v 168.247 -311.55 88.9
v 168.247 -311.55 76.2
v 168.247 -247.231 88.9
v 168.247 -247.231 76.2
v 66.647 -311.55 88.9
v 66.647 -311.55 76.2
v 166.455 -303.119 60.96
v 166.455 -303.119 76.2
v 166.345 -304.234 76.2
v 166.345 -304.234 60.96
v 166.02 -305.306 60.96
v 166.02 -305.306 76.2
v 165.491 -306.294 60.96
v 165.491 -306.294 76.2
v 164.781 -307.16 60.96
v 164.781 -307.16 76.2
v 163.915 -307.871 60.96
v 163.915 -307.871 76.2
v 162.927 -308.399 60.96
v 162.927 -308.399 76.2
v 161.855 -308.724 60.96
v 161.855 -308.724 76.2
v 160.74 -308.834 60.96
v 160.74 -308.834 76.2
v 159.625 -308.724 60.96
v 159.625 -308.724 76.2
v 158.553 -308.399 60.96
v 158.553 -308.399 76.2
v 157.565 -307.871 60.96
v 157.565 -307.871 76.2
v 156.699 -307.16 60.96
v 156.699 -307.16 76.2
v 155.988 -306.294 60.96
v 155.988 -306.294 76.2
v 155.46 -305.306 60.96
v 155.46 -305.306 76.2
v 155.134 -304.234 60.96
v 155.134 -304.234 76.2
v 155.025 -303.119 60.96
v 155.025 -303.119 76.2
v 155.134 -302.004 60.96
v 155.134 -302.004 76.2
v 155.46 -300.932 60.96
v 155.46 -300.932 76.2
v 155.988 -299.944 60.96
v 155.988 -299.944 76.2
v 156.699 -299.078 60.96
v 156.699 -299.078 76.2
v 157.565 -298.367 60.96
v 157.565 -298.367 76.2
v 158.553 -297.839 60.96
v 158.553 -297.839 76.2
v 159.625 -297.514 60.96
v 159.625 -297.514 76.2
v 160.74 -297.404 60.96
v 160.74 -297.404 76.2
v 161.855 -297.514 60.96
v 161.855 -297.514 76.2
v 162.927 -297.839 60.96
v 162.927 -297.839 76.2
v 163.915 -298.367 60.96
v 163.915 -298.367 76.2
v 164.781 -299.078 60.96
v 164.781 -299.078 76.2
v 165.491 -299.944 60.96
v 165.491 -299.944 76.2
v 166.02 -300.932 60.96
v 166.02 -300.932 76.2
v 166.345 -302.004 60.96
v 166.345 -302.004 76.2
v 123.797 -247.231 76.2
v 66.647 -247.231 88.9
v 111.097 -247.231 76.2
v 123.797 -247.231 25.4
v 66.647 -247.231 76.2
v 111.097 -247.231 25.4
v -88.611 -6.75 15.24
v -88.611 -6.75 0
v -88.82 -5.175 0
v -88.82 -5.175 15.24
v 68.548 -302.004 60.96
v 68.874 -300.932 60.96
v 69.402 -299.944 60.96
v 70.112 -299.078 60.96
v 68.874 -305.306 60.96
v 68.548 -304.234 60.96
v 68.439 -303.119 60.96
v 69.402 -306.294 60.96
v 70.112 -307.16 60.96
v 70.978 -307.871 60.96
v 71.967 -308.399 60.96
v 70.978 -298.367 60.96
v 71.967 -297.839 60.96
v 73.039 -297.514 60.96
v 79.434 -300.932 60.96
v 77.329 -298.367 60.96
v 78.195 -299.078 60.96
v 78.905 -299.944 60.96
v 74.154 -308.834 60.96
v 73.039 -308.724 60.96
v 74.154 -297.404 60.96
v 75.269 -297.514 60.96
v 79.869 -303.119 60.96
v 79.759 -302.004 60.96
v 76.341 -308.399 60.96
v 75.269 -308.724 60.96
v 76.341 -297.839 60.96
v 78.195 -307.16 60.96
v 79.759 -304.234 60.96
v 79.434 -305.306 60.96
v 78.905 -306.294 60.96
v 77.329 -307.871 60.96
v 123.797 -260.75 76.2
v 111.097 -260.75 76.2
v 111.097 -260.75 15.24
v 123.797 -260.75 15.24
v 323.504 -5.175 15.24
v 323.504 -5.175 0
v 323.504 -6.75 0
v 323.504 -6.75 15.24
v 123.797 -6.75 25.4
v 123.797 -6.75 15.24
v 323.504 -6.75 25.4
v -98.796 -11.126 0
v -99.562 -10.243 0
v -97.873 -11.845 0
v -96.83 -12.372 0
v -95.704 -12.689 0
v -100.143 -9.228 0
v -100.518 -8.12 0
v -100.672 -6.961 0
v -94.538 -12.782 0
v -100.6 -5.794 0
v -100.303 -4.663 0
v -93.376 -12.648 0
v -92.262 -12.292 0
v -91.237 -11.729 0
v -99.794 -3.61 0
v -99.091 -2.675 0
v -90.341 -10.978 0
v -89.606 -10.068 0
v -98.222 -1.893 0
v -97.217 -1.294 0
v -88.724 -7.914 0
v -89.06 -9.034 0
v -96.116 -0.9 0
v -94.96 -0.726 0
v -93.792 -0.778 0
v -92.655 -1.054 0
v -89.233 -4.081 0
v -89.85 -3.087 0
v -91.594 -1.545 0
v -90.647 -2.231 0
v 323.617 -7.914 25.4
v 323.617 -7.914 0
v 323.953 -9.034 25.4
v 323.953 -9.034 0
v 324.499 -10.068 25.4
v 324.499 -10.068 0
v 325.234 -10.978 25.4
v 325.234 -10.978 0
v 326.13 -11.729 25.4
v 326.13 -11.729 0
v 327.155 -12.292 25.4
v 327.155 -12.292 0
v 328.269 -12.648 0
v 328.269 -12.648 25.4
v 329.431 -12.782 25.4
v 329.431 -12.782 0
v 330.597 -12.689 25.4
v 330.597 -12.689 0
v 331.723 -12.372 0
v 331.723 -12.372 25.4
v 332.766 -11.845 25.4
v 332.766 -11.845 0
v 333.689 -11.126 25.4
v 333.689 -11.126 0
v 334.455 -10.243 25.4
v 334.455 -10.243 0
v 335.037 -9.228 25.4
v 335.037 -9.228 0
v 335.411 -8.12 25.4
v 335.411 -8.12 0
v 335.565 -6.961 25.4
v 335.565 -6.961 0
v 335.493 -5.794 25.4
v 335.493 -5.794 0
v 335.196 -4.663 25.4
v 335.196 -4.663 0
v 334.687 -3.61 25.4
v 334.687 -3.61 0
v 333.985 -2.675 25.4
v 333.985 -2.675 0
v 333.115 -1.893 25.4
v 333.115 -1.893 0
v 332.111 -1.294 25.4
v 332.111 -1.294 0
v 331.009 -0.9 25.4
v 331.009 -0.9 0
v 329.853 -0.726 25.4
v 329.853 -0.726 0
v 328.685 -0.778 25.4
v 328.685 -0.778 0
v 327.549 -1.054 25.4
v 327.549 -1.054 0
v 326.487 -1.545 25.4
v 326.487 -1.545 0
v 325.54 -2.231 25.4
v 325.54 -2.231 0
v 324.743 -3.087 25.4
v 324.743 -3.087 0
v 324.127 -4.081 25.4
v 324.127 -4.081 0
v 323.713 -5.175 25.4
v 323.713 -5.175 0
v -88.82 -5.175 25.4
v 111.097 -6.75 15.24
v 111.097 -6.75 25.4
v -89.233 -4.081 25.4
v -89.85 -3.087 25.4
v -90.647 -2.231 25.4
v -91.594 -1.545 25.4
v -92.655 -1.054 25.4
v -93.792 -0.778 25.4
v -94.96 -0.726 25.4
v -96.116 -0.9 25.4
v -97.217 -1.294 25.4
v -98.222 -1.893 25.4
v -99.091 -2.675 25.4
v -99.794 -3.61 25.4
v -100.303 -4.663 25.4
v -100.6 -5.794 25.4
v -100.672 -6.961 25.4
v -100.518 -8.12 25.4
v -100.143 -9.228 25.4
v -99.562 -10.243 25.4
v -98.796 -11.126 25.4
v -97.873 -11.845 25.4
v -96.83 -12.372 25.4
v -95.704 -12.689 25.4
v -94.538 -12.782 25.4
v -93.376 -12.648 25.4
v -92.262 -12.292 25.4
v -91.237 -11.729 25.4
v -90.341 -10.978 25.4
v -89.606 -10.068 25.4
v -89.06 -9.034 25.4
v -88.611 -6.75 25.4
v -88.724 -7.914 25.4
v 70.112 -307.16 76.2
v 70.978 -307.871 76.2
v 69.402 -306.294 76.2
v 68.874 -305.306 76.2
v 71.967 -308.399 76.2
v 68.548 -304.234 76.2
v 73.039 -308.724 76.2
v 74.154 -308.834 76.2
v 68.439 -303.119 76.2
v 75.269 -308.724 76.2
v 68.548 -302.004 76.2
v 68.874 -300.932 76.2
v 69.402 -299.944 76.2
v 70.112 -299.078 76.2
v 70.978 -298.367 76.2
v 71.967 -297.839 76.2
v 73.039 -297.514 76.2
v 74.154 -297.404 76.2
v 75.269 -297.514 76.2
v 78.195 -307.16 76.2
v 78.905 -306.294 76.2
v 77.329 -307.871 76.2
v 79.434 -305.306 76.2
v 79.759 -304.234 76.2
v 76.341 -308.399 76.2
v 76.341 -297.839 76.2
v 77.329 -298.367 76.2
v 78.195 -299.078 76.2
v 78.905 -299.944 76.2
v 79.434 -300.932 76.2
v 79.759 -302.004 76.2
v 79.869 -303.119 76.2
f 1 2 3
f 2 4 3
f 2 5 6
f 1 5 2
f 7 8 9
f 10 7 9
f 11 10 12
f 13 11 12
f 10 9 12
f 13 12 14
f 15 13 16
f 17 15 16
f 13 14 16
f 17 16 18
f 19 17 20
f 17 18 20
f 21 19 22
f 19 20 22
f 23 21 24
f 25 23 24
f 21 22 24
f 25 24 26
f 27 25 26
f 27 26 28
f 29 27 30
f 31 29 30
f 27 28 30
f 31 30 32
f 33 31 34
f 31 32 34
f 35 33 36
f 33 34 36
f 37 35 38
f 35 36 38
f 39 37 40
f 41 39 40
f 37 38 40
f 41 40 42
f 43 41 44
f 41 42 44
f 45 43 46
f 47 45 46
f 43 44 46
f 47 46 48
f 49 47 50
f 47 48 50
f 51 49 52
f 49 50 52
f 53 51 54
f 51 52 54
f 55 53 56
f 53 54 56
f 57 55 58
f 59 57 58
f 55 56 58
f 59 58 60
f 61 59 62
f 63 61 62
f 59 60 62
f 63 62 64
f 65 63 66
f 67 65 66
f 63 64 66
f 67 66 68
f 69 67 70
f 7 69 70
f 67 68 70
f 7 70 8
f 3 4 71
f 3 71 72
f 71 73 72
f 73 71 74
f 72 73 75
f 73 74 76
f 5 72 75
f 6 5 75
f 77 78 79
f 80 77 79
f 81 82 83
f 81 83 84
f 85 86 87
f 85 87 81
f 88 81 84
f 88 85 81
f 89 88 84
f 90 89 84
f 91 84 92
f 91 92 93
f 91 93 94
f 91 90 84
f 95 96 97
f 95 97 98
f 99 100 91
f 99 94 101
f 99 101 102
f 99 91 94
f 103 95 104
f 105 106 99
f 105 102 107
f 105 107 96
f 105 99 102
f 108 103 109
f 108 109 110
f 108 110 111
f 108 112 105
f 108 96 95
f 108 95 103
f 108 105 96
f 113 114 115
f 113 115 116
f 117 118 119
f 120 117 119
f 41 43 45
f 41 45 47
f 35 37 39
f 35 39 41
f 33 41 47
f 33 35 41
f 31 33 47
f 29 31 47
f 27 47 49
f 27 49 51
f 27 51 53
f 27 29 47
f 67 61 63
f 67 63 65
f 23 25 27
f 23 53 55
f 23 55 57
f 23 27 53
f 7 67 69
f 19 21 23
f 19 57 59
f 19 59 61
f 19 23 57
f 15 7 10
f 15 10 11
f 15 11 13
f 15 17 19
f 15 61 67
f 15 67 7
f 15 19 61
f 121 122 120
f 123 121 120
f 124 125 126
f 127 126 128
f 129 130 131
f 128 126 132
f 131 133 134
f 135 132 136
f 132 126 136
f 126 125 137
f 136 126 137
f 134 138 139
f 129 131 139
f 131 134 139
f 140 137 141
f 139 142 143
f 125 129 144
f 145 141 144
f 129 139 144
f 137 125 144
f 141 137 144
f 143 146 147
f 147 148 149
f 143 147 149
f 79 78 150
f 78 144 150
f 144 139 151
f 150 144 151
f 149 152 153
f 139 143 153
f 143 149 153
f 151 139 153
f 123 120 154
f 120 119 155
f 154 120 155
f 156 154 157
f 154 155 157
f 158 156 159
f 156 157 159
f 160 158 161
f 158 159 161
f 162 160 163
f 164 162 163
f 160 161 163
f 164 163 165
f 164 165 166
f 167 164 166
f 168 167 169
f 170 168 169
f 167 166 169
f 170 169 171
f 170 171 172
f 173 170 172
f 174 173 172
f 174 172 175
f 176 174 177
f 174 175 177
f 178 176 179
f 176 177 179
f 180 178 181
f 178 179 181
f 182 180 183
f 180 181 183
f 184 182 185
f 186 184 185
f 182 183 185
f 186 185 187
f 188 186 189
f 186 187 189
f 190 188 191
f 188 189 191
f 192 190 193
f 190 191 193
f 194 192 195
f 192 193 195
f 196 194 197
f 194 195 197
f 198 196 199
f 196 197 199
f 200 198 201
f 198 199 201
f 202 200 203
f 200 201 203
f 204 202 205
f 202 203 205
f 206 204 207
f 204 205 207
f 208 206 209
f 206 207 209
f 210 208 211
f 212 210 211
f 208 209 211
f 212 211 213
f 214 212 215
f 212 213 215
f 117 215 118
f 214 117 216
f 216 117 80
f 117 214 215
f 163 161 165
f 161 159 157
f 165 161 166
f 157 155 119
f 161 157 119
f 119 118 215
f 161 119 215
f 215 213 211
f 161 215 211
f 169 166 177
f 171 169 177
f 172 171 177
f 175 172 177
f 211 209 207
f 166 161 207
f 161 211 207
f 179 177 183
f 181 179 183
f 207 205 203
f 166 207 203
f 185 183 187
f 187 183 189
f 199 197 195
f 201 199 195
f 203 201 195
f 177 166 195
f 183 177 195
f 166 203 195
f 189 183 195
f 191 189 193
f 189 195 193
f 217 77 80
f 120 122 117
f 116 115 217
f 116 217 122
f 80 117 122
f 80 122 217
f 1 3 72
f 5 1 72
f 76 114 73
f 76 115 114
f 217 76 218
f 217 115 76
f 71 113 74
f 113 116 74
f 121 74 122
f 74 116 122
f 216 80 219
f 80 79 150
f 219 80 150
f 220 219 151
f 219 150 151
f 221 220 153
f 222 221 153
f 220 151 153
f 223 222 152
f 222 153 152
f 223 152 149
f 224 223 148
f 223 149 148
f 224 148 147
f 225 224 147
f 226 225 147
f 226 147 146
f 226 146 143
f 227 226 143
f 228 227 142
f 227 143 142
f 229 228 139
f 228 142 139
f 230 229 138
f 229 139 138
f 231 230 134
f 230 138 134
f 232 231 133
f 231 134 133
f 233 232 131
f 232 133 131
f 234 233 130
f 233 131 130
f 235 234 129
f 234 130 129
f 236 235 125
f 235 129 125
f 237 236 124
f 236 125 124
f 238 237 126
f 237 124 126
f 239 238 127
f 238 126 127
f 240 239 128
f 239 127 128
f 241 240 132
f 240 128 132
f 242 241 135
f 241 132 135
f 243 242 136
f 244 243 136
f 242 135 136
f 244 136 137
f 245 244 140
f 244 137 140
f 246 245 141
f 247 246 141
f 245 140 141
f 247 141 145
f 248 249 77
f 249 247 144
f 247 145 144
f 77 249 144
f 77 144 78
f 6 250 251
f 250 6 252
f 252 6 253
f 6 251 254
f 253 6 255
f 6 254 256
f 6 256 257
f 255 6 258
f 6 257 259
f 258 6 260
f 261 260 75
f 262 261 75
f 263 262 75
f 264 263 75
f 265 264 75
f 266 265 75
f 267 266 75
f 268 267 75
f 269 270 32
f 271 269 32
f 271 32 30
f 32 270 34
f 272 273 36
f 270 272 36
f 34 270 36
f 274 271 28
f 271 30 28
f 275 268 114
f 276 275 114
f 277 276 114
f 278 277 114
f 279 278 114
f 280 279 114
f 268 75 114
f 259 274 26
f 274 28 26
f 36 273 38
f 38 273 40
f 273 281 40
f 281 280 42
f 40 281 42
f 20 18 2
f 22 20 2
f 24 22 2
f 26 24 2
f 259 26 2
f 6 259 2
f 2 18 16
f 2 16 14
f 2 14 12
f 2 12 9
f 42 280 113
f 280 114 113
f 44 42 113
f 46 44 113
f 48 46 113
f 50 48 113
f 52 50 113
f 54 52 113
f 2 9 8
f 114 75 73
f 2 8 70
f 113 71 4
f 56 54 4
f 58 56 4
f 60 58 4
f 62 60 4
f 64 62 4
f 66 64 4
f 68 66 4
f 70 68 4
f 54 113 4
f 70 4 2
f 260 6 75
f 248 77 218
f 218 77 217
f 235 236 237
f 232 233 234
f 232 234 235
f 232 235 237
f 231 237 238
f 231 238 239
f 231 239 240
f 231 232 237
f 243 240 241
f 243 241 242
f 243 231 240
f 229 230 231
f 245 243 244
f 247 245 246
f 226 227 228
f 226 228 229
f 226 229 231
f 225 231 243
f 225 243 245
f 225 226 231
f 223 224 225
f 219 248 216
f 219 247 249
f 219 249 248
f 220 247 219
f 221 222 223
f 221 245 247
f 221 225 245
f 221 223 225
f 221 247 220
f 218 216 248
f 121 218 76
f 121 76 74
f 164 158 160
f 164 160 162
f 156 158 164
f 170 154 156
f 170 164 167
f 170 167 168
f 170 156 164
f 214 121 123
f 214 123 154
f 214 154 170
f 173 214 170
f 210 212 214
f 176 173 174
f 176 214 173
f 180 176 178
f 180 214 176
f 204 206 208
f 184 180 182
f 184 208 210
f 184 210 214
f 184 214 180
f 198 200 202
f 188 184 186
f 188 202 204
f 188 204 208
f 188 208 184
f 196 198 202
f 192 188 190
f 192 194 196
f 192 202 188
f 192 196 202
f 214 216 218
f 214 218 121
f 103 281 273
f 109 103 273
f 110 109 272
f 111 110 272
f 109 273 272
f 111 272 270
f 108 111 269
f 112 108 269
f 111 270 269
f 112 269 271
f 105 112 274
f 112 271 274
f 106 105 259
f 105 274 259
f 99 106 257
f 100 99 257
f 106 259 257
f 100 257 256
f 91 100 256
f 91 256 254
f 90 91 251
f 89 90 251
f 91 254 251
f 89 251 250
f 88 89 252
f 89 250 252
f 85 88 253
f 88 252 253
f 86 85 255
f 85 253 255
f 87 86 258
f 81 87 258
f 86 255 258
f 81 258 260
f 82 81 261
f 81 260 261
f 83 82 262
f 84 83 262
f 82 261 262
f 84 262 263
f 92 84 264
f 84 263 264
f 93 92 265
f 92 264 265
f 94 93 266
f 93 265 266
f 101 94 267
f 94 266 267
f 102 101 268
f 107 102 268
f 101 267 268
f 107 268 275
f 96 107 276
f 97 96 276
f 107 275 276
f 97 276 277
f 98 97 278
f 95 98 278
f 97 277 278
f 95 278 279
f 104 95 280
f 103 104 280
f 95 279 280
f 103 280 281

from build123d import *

# Parameters (mm, degrees)
F1_DEPTH  = 25.4
F3_DEPTH  = 15.24
F5_DEPTH  = 254
F6_W      = 12.7
F6_H      = 13.51927
F7_DEPTH  = 50.8
F9_DEPTH  = 12.7
F11_DEPTH = 50.8
F12_R     = 5.715
F13_DEPTH = 15.24


with BuildPart() as f1:
    # F0 (on Top) → F1 (new body)
    with BuildSketch(Plane.XY):
        with BuildLine():
            Line((-86.490609, -5.174935), (-88.820125, -5.174935))
            ThreePointArc((-88.820125, -5.174935), (-100.623355, -7.544352), (-88.610892, -6.749934))
            Line((-88.610892, -6.749934), (323.504108, -6.749934))
            ThreePointArc((323.504108, -6.749934), (335.516571, -7.544352), (323.713342, -5.174935))
            Line((323.713342, -5.174935), (-86.490609, -5.174935))
        make_face()
    extrude(amount=F1_DEPTH)

    # F2 (on face) → F3 (cut)
    with BuildSketch(Plane(origin=(0, 0, 0), x_dir=(1, 0, 0), z_dir=(0, 0, -1))):
        Polygon((323.504108, 5.174935), (323.504108, 6.749934), (-88.610892, 6.749934), (-88.820125, 5.174935), align=None)
    extrude(amount=-F3_DEPTH, mode=Mode.SUBTRACT)

    # F4 (on face) → F5 (join)
    with BuildSketch(Plane.XZ.offset(6.749934)):
        Polygon((123.796608, 25.4), (117.446608, 25.4), (111.096608, 25.4), (111.096608, 15.24), (123.796608, 15.24), align=None)
    extrude(amount=F5_DEPTH)

    # F6 (on face) → F7 (join)
    with BuildSketch(Plane.XY.offset(25.4)):
        with Locations((117.446608, -253.990299)):
            Rectangle(F6_W, F6_H)
    extrude(amount=F7_DEPTH)

    # F8 (on face) → F9 (join)
    with BuildSketch(Plane.XY.offset(76.2)):
        Polygon((168.246608, -247.230664), (111.096608, -247.230664), (66.646608, -247.230664), (66.646608, -260.749934), (168.246608, -260.749934), align=None)
    extrude(amount=F9_DEPTH)

    # F10 (on face) → F11 (join)
    with BuildSketch(Plane.XZ.offset(260.749934)):
        Polygon((66.646608, 88.9), (66.646608, 76.2), (111.096608, 76.2), (123.796608, 76.2), (168.246608, 76.2), (168.246608, 88.9), align=None)
    extrude(amount=F11_DEPTH)

    # F12 (on face) → F13 (join)
    with BuildSketch(Plane(origin=(0, 0, 76.2), x_dir=(1, 0, 0), z_dir=(0, 0, -1))):
        with Locations((74.153578, 303.118765)):
            Circle(F12_R)
        with Locations((160.739638, 303.118765)):
            Circle(F12_R)
    extrude(amount=F13_DEPTH)


solid = f1.part
